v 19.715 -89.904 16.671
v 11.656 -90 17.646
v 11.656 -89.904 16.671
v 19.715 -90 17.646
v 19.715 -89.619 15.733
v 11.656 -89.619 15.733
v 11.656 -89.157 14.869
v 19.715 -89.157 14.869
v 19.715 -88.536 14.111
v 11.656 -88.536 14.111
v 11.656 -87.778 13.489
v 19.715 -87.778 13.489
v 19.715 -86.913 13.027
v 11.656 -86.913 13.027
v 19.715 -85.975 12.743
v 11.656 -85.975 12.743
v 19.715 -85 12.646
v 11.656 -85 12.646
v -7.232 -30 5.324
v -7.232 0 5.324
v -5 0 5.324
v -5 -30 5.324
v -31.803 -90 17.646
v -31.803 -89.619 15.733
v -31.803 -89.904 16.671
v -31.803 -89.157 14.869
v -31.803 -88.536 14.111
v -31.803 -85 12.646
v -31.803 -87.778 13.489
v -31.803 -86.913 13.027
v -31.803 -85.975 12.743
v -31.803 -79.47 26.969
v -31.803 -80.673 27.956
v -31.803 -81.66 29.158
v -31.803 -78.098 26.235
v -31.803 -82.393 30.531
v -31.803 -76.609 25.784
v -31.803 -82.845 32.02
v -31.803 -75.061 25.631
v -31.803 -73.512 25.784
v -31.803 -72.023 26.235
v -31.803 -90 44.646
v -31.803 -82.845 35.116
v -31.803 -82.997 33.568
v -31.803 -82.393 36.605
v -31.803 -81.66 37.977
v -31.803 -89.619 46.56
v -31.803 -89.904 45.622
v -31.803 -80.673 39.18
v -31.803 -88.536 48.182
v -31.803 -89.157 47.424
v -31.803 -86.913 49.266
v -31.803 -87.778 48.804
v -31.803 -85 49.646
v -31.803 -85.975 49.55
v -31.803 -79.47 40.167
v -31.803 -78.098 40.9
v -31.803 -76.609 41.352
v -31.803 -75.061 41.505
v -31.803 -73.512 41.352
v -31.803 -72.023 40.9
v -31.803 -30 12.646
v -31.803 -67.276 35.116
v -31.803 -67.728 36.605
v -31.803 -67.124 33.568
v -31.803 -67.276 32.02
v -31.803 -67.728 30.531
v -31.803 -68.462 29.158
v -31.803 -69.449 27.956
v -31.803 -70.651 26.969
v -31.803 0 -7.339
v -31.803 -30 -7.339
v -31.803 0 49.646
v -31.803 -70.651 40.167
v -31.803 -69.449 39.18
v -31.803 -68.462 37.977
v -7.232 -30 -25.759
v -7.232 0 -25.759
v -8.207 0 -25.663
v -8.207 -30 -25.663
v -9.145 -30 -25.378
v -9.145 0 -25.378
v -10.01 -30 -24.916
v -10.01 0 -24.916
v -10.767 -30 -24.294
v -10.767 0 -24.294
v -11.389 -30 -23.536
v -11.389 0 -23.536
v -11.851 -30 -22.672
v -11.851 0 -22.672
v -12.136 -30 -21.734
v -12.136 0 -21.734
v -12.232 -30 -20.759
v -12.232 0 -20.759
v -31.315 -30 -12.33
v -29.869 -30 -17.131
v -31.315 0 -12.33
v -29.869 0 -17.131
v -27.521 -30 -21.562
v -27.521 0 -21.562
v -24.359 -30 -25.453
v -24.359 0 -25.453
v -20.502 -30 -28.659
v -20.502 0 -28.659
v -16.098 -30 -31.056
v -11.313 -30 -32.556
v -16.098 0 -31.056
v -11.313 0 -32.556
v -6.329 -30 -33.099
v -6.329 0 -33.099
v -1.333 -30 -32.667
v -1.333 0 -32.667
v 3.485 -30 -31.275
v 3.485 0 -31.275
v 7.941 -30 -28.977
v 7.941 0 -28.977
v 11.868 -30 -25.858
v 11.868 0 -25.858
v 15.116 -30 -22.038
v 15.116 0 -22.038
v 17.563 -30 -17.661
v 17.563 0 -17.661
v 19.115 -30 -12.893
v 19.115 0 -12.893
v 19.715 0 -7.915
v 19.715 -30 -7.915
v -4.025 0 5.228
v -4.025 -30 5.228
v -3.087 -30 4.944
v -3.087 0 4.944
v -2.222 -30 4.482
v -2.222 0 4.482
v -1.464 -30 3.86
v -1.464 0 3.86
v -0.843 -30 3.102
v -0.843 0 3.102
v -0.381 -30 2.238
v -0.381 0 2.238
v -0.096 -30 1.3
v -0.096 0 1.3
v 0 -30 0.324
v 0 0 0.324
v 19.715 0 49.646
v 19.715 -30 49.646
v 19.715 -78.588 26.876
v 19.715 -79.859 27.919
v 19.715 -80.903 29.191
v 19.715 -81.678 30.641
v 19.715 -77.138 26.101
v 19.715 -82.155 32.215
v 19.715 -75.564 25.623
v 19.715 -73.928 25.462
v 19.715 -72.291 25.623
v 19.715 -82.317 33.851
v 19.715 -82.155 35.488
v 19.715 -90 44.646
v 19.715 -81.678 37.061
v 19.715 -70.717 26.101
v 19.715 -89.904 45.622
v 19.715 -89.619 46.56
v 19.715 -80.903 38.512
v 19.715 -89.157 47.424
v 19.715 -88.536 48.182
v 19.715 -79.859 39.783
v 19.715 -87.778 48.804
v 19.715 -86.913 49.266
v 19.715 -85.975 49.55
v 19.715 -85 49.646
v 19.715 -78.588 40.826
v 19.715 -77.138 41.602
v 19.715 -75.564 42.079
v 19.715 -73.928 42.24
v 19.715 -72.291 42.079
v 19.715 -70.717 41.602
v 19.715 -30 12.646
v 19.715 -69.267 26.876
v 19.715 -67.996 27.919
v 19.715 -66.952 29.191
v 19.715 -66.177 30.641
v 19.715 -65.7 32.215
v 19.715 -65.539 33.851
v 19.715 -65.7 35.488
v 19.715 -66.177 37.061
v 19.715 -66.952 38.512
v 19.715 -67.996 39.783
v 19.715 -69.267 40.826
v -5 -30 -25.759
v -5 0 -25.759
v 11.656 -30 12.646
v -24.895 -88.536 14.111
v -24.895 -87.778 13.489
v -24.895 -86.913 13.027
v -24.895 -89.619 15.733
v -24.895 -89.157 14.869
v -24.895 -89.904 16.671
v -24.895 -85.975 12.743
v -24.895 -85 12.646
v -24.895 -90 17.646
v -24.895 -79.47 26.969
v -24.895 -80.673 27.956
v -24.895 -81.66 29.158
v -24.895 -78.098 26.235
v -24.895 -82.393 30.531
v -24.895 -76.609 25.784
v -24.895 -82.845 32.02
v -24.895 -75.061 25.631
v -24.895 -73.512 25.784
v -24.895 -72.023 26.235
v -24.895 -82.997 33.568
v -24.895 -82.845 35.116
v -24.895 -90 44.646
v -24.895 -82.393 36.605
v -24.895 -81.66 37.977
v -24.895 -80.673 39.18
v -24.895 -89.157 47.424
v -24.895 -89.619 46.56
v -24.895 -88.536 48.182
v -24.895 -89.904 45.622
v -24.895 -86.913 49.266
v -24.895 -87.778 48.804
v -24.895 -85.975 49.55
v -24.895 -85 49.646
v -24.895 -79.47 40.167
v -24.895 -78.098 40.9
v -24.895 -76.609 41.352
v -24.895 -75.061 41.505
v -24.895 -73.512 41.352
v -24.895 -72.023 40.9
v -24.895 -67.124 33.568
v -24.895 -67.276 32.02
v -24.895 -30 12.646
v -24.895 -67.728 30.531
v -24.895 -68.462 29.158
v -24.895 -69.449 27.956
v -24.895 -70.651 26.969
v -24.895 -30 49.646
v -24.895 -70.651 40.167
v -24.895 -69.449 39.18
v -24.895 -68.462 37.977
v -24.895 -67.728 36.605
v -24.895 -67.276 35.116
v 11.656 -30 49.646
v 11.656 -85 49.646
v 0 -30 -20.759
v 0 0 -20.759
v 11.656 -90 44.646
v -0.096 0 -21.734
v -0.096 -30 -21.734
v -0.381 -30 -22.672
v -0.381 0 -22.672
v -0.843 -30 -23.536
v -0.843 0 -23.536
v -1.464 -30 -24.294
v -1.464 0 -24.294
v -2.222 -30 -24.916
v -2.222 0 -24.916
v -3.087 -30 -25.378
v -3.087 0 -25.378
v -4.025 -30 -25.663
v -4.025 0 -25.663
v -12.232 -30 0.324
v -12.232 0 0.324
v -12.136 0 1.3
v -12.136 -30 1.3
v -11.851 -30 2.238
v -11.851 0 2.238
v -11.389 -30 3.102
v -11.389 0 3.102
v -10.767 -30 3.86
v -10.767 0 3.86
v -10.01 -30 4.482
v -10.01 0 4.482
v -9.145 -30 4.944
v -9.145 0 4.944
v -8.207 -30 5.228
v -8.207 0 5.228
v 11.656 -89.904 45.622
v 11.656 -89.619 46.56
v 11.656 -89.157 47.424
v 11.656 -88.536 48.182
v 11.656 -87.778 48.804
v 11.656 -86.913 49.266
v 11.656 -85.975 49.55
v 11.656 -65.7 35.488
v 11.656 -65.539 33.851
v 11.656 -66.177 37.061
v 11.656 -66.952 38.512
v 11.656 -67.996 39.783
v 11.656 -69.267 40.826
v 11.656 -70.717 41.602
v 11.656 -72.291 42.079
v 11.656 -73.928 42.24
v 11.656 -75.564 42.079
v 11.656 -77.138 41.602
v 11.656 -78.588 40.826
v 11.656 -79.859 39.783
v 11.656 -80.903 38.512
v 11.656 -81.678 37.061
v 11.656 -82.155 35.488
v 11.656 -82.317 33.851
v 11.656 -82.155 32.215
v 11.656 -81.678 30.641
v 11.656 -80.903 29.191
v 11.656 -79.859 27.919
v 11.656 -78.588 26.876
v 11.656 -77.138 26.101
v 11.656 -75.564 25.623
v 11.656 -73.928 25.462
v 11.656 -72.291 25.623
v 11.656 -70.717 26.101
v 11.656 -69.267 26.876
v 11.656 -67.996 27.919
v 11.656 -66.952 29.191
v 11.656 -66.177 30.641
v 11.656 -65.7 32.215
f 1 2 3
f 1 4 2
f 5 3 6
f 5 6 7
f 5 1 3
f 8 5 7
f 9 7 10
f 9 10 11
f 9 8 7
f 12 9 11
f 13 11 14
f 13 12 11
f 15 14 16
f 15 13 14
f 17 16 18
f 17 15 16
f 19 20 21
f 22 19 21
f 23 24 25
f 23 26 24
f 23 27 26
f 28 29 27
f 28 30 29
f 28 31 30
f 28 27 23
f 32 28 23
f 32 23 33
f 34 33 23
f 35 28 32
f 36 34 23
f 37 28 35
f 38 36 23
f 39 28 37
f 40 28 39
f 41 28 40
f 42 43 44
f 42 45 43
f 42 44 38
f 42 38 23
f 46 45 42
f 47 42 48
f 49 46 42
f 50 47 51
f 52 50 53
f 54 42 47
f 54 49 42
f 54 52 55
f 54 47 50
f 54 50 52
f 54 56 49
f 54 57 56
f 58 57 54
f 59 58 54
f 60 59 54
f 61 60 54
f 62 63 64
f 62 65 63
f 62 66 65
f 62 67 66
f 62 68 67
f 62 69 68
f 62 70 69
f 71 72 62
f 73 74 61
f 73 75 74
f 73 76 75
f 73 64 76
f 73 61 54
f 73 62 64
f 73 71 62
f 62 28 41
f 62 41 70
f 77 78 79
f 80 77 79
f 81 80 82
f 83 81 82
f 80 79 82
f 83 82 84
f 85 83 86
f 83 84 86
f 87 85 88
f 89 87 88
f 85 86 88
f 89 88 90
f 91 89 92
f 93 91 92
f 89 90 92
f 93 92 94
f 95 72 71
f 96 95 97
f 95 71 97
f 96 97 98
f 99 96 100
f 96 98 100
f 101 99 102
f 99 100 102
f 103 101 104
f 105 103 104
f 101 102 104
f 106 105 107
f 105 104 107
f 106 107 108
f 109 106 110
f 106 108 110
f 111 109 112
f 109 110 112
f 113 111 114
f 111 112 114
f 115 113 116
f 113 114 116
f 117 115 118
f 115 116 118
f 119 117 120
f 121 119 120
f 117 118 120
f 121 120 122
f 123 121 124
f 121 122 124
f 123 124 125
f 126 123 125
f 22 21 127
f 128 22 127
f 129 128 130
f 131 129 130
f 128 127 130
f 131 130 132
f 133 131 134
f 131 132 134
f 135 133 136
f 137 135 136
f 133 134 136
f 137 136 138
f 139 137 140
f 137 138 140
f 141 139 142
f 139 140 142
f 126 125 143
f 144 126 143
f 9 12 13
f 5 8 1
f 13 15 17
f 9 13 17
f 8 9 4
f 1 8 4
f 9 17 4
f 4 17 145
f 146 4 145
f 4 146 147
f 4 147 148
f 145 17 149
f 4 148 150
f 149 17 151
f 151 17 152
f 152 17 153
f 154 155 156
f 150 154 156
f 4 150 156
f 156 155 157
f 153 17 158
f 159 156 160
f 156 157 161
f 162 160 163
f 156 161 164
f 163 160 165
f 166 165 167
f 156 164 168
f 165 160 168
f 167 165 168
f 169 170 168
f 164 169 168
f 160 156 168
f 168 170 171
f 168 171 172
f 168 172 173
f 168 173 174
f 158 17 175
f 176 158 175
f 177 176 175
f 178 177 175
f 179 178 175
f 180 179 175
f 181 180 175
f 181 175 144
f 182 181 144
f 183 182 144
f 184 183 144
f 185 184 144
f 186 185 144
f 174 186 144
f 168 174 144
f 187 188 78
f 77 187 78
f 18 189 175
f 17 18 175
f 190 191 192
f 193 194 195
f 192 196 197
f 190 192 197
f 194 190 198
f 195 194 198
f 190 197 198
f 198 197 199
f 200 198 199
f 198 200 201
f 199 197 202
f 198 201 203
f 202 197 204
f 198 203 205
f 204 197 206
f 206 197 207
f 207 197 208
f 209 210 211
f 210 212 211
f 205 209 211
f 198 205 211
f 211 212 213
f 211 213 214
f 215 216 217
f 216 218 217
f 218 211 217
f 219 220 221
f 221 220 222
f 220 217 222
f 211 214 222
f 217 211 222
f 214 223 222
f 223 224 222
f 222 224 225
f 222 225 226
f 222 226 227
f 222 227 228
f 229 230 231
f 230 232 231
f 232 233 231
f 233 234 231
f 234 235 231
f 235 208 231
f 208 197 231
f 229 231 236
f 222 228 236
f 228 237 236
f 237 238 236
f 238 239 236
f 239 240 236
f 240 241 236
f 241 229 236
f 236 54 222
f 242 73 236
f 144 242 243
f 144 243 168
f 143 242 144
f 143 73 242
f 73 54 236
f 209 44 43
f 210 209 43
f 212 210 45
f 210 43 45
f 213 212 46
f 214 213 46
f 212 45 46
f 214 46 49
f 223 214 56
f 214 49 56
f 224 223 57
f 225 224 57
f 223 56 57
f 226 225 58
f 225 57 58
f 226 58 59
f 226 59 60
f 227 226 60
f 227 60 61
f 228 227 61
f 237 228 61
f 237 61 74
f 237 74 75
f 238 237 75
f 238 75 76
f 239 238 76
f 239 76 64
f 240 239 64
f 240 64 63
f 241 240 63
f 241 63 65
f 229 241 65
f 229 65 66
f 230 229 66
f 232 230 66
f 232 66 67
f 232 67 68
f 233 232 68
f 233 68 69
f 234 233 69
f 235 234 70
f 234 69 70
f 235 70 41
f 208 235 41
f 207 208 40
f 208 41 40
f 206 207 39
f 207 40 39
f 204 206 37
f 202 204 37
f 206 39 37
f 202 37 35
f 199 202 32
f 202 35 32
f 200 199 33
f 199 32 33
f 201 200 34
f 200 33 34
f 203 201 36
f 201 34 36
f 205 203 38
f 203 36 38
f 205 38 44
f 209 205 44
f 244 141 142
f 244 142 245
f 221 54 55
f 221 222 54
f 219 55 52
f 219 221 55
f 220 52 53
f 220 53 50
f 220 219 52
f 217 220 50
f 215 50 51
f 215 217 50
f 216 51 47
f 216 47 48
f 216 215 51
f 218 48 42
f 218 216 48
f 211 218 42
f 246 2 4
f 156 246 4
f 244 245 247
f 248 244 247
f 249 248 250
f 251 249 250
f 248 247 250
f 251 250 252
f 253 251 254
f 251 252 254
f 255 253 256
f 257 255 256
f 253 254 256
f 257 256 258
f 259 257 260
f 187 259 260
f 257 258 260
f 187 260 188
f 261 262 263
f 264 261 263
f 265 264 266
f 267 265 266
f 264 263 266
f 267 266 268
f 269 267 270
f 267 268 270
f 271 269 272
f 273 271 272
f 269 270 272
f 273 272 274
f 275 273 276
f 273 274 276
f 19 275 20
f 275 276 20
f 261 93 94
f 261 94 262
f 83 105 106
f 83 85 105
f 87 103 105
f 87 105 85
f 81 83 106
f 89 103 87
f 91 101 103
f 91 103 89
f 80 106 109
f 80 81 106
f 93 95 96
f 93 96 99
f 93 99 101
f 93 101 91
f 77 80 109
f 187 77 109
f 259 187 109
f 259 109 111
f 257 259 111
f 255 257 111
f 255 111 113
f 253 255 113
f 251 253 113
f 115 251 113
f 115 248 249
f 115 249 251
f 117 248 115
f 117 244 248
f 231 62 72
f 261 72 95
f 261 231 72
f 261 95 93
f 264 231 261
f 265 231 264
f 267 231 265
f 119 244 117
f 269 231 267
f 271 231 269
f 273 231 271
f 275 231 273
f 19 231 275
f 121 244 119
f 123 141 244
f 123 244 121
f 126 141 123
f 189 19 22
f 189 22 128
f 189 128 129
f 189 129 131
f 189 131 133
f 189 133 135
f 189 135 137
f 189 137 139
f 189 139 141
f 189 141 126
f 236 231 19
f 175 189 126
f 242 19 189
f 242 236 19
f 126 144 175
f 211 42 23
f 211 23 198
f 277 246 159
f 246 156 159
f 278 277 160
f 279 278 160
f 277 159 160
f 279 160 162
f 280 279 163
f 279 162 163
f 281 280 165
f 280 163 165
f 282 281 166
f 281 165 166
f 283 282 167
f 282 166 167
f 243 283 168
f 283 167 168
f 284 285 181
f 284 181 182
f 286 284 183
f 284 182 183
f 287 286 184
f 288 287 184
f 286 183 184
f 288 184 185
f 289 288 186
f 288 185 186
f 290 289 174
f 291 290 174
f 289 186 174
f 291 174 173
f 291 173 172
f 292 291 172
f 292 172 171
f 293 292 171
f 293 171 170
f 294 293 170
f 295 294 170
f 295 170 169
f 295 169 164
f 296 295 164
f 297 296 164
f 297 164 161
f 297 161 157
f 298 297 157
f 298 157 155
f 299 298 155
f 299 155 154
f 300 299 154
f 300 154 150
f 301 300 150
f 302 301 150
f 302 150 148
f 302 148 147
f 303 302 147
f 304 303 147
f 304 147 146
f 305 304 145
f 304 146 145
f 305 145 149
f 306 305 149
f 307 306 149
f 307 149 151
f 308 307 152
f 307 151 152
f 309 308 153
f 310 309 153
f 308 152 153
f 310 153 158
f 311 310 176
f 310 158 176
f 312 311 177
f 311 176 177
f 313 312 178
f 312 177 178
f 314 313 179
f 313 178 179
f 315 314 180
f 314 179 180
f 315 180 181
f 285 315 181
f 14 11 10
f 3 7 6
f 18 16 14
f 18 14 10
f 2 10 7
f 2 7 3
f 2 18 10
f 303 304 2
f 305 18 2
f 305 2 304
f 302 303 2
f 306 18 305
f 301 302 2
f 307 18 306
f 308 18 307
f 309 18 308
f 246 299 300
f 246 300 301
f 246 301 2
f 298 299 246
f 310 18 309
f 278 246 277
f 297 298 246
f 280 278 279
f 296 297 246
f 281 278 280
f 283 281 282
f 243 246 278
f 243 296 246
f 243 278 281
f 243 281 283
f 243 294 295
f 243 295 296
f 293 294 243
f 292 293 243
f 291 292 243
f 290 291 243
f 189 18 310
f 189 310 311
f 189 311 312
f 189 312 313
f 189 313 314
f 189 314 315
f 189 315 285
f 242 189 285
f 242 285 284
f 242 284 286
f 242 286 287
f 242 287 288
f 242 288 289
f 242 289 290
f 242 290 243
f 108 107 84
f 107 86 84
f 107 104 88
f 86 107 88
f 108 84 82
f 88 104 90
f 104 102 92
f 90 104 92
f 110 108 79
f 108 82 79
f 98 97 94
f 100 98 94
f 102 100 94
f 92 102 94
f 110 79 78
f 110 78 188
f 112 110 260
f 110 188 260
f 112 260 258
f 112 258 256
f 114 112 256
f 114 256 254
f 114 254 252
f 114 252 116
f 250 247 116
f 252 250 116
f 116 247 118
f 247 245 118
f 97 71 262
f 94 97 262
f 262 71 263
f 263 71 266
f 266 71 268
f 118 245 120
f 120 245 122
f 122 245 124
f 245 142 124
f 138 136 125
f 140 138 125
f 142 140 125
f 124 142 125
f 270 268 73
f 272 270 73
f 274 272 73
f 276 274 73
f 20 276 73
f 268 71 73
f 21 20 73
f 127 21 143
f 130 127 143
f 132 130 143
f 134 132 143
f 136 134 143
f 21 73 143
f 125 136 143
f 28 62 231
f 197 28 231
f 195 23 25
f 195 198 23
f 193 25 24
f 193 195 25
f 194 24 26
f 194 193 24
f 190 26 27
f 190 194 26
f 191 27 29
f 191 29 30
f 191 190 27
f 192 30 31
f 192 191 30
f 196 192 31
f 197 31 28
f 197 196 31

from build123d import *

# Parameters (mm, degrees)
F1_DEPTH = 30
F2_W     = 6.907336
F2_H     = 37
F2_W_2   = 8.058561
F3_DEPTH = 60
F4_R     = 5
F5_R     = 8.388912
F6_DEPTH = 30
F7_R     = 7.936713
F8_DEPTH = 30


with BuildPart() as f1:
    # F0 (on Front) → F1 (new body)
    with BuildSketch(Plane.XZ):
        with BuildLine():
            Line((19.714694, 49.646493), (-31.802535, 49.646493))
            Line((-31.802535, 49.646493), (-31.802535, -7.339047))
            ThreePointArc((-31.802535, -7.339047), (-6.328528, -33.099269), (19.714694, -7.914659))
            Line((19.714694, -7.914659), (19.714694, 49.646493))
        make_face()
        with BuildLine():
            ThreePointArc((-12.231744, 0.324407), (-10.767278, 3.85994), (-7.231744, 5.324407))
            Line((-7.231744, 5.324407), (-5, 5.324407))
            ThreePointArc((-5, 5.324407), (-1.464466, 3.85994), (0, 0.324407))
            Line((0, 0.324407), (0, -20.758615))
            ThreePointArc((0, -20.758615), (-1.464466, -24.294149), (-5, -25.758615))
            Line((-5, -25.758615), (-7.231744, -25.758615))
            ThreePointArc((-7.231744, -25.758615), (-10.767278, -24.294149), (-12.231744, -20.758615))
            Line((-12.231744, -20.758615), (-12.231744, 0.324407))
        make_face(mode=Mode.SUBTRACT)
    extrude(amount=F1_DEPTH)

    # F2 (on face) → F3 (join)
    with BuildSketch(Plane.XZ.offset(30)):
        with Locations((-28.348867, 31.146493)):
            Rectangle(F2_W, F2_H)
        with Locations((15.685413, 31.146493)):
            Rectangle(F2_W_2, F2_H)
    extrude(amount=F3_DEPTH)

    # F4
    f4_edges = [f1.edges().sort_by_distance(p)[0] for p in [
        (15.685413, -90, 49.646493),
        (15.685413, -90, 12.646493),
        (-28.348867, -90, 49.646493),
        (-28.348867, -90, 12.646493),
    ]]
    fillet(f4_edges, radius=F4_R)

    # F5 (on face) → F6 (cut)
    with BuildSketch(Plane.YZ.offset(19.714694)):
        with Locations((-73.927611, 33.851173)):
            Circle(F5_R)
    extrude(amount=-F6_DEPTH, mode=Mode.SUBTRACT)

    # F7 (on face) → F8 (cut)
    with BuildSketch(Plane(origin=(-31.802535, 0, 0), x_dir=(0, -1, 0), z_dir=(-1, 0, 0))):
        with Locations((75.060703, 33.567894)):
            Circle(F7_R)
    extrude(amount=-F8_DEPTH, mode=Mode.SUBTRACT)


solid = f1.part
